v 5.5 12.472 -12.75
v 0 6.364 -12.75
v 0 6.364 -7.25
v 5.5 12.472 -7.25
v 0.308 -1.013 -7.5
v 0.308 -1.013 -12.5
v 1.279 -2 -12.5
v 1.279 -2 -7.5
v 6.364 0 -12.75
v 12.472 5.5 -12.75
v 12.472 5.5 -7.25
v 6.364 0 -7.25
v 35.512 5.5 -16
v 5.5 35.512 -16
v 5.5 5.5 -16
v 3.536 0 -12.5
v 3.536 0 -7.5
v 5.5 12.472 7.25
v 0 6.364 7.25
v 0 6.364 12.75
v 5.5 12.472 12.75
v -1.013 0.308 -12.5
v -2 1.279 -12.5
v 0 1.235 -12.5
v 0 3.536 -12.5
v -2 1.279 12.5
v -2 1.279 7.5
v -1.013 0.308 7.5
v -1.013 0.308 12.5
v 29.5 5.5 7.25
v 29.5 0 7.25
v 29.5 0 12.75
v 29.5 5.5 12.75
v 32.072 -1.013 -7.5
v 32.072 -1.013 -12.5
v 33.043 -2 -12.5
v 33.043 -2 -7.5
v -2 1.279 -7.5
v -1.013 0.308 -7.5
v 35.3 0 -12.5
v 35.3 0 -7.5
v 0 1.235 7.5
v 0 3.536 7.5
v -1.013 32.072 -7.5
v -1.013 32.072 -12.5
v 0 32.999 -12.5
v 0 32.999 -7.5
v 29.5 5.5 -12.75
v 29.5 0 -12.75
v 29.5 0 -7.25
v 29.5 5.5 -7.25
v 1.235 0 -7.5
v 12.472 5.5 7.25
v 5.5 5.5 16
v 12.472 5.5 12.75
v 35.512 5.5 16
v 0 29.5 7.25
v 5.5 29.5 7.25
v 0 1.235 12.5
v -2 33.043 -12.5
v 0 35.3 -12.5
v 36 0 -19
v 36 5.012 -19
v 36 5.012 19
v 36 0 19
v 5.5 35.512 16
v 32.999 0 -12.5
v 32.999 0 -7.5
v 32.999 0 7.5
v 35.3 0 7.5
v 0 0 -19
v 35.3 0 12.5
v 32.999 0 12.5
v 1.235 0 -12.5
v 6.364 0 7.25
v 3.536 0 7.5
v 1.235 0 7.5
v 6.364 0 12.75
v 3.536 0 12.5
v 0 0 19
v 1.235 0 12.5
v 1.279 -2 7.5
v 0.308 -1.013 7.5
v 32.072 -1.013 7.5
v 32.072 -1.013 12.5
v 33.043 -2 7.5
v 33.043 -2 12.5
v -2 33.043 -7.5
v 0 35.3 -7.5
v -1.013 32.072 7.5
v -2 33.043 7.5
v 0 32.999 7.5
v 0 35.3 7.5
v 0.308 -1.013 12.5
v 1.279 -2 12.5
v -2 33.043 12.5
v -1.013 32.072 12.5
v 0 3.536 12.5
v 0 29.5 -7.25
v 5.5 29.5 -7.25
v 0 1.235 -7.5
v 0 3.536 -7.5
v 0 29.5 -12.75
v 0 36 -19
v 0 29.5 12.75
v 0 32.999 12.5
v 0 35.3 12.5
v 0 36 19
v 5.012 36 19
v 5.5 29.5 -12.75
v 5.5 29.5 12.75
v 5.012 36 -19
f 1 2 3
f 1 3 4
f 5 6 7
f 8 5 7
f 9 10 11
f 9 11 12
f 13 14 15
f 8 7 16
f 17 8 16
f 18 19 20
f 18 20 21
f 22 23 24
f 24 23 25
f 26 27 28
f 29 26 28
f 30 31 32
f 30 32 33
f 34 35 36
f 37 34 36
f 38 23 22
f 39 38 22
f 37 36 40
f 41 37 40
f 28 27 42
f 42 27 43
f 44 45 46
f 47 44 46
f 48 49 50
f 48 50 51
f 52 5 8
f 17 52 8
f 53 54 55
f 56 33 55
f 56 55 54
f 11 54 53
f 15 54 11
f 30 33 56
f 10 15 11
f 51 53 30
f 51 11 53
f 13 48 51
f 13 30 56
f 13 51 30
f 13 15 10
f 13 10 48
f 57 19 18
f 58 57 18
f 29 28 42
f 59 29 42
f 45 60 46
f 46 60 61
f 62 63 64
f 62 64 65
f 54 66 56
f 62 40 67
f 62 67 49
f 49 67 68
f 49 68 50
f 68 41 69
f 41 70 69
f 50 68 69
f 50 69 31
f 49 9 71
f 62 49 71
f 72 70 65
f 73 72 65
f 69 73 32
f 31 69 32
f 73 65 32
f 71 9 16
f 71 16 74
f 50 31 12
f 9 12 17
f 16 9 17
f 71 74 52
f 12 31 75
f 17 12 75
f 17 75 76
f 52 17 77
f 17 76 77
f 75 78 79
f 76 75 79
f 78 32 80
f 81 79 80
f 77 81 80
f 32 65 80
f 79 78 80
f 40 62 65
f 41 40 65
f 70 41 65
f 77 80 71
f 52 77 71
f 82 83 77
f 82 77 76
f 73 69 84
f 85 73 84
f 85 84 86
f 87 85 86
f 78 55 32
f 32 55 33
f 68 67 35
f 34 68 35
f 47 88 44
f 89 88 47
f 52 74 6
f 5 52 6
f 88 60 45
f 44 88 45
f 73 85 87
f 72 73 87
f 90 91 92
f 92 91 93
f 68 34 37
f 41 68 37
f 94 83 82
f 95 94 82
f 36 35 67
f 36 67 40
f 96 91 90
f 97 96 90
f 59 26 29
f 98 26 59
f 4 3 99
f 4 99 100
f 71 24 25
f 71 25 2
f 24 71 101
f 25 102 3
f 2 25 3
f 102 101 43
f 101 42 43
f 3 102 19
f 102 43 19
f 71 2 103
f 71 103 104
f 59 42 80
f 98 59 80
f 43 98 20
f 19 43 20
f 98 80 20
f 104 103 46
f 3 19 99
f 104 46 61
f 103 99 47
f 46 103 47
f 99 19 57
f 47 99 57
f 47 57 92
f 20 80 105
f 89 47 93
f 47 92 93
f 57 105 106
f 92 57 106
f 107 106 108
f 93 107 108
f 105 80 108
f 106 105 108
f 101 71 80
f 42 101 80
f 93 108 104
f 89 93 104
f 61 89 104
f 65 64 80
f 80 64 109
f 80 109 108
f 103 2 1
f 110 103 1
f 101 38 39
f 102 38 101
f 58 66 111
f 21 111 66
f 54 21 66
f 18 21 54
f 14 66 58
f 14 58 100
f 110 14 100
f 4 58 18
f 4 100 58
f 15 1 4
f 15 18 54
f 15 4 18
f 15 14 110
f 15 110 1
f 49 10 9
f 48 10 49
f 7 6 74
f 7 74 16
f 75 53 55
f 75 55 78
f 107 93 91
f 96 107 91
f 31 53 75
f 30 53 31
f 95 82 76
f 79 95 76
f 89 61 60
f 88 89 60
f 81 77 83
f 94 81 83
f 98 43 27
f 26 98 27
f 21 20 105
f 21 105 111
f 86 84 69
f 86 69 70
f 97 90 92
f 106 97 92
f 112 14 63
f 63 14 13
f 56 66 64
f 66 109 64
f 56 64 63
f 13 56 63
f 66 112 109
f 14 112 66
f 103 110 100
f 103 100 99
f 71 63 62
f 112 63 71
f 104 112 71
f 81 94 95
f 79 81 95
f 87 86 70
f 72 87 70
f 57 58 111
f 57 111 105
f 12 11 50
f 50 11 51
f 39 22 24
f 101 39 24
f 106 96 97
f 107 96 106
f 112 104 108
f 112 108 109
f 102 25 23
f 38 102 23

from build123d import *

# Parameters (mm, degrees)
BOSS_EXTRUDE1_DEPTH = 19
CUT_EXTRUDE1_START  = -16
CUT_EXTRUDE1_DEPTH  = 32
MIRROR1_START       = -12.75
MIRROR1_DEPTH       = 5.5
MIRROR1_START_2     = 7.25
MIRROR1_2_DEPTH     = 5.5
MIRROR1_START_3     = -12.5
MIRROR1_3_DEPTH     = 5
MIRROR1_START_4     = 7.5
MIRROR1_4_DEPTH     = 5


# Read off the part's stored shape, not the designer's step: Mirror1
with BuildPart() as part:
    # Sketch1 → Boss-Extrude1 (new, symmetric)
    with BuildSketch(Plane.XY):
        Polygon((0, 0), (0, 36), (5.012193309, 36), (36, 5.012193309), (36, 0), align=None)
    extrude(amount=BOSS_EXTRUDE1_DEPTH, both=True)

    # Sketch2 → Cut-Extrude1 (cut)
    with BuildSketch(Plane.XY.offset(CUT_EXTRUDE1_START)):
        Polygon((5.5, 35.512193309), (5.5, 5.5), (35.512193309, 5.5), align=None)
    extrude(amount=CUT_EXTRUDE1_DEPTH, mode=Mode.SUBTRACT)

    # Mirror1 outline → Mirror1 (cut)
    with BuildSketch(Plane.XY.offset(MIRROR1_START)):
        Polygon((5.5, 12.472329862), (5.5, 29.5), (0, 29.5), (0, 6.363961031), align=None)
        Polygon((29.5, 5.5), (12.472329862, 5.5), (6.363961031, 0), (29.5, 0), align=None)
    extrude(amount=MIRROR1_DEPTH, mode=Mode.SUBTRACT)

    # Mirror1 2 outline → Mirror1 2 (cut)
    with BuildSketch(Plane.XY.offset(MIRROR1_START_2)):
        Polygon((5.5, 12.472329862), (5.5, 29.5), (0, 29.5), (0, 6.363961031), align=None)
        Polygon((29.5, 5.5), (12.472329862, 5.5), (6.363961031, 0), (29.5, 0), align=None)
    extrude(amount=MIRROR1_2_DEPTH, mode=Mode.SUBTRACT)

    # Mirror1 3 outline → Mirror1 3 (add)
    with BuildSketch(Plane.XY.offset(MIRROR1_START_3)):
        Polygon((35.3, 0), (32.999216572, 0), (32.072195597, -1.013438577), (33.043379246, -2), align=None)
        Polygon((-1.013438577, 32.072195597), (0, 32.999216572), (0, 35.3), (-2, 33.043379246), align=None)
        Polygon((0, 1.234750477), (0, 3.535533906), (-2, 1.278913151), (-1.013438577, 0.307729503), align=None)
        Polygon((1.278913151, -2), (3.535533906, 0), (1.234750477, 0), (0.307729503, -1.013438577), align=None)
    extrude(amount=MIRROR1_3_DEPTH)

    # Mirror1 4 outline → Mirror1 4 (add)
    with BuildSketch(Plane.XY.offset(MIRROR1_START_4)):
        Polygon((35.3, 0), (32.999216572, 0), (32.072195597, -1.013438577), (33.043379246, -2), align=None)
        Polygon((-1.013438577, 32.072195597), (0, 32.999216572), (0, 35.3), (-2, 33.043379246), align=None)
        Polygon((0, 1.234750477), (0, 3.535533906), (-2, 1.278913151), (-1.013438577, 0.307729503), align=None)
        Polygon((1.278913151, -2), (3.535533906, 0), (1.234750477, 0), (0.307729503, -1.013438577), align=None)
    extrude(amount=MIRROR1_4_DEPTH)


solid = part.part
